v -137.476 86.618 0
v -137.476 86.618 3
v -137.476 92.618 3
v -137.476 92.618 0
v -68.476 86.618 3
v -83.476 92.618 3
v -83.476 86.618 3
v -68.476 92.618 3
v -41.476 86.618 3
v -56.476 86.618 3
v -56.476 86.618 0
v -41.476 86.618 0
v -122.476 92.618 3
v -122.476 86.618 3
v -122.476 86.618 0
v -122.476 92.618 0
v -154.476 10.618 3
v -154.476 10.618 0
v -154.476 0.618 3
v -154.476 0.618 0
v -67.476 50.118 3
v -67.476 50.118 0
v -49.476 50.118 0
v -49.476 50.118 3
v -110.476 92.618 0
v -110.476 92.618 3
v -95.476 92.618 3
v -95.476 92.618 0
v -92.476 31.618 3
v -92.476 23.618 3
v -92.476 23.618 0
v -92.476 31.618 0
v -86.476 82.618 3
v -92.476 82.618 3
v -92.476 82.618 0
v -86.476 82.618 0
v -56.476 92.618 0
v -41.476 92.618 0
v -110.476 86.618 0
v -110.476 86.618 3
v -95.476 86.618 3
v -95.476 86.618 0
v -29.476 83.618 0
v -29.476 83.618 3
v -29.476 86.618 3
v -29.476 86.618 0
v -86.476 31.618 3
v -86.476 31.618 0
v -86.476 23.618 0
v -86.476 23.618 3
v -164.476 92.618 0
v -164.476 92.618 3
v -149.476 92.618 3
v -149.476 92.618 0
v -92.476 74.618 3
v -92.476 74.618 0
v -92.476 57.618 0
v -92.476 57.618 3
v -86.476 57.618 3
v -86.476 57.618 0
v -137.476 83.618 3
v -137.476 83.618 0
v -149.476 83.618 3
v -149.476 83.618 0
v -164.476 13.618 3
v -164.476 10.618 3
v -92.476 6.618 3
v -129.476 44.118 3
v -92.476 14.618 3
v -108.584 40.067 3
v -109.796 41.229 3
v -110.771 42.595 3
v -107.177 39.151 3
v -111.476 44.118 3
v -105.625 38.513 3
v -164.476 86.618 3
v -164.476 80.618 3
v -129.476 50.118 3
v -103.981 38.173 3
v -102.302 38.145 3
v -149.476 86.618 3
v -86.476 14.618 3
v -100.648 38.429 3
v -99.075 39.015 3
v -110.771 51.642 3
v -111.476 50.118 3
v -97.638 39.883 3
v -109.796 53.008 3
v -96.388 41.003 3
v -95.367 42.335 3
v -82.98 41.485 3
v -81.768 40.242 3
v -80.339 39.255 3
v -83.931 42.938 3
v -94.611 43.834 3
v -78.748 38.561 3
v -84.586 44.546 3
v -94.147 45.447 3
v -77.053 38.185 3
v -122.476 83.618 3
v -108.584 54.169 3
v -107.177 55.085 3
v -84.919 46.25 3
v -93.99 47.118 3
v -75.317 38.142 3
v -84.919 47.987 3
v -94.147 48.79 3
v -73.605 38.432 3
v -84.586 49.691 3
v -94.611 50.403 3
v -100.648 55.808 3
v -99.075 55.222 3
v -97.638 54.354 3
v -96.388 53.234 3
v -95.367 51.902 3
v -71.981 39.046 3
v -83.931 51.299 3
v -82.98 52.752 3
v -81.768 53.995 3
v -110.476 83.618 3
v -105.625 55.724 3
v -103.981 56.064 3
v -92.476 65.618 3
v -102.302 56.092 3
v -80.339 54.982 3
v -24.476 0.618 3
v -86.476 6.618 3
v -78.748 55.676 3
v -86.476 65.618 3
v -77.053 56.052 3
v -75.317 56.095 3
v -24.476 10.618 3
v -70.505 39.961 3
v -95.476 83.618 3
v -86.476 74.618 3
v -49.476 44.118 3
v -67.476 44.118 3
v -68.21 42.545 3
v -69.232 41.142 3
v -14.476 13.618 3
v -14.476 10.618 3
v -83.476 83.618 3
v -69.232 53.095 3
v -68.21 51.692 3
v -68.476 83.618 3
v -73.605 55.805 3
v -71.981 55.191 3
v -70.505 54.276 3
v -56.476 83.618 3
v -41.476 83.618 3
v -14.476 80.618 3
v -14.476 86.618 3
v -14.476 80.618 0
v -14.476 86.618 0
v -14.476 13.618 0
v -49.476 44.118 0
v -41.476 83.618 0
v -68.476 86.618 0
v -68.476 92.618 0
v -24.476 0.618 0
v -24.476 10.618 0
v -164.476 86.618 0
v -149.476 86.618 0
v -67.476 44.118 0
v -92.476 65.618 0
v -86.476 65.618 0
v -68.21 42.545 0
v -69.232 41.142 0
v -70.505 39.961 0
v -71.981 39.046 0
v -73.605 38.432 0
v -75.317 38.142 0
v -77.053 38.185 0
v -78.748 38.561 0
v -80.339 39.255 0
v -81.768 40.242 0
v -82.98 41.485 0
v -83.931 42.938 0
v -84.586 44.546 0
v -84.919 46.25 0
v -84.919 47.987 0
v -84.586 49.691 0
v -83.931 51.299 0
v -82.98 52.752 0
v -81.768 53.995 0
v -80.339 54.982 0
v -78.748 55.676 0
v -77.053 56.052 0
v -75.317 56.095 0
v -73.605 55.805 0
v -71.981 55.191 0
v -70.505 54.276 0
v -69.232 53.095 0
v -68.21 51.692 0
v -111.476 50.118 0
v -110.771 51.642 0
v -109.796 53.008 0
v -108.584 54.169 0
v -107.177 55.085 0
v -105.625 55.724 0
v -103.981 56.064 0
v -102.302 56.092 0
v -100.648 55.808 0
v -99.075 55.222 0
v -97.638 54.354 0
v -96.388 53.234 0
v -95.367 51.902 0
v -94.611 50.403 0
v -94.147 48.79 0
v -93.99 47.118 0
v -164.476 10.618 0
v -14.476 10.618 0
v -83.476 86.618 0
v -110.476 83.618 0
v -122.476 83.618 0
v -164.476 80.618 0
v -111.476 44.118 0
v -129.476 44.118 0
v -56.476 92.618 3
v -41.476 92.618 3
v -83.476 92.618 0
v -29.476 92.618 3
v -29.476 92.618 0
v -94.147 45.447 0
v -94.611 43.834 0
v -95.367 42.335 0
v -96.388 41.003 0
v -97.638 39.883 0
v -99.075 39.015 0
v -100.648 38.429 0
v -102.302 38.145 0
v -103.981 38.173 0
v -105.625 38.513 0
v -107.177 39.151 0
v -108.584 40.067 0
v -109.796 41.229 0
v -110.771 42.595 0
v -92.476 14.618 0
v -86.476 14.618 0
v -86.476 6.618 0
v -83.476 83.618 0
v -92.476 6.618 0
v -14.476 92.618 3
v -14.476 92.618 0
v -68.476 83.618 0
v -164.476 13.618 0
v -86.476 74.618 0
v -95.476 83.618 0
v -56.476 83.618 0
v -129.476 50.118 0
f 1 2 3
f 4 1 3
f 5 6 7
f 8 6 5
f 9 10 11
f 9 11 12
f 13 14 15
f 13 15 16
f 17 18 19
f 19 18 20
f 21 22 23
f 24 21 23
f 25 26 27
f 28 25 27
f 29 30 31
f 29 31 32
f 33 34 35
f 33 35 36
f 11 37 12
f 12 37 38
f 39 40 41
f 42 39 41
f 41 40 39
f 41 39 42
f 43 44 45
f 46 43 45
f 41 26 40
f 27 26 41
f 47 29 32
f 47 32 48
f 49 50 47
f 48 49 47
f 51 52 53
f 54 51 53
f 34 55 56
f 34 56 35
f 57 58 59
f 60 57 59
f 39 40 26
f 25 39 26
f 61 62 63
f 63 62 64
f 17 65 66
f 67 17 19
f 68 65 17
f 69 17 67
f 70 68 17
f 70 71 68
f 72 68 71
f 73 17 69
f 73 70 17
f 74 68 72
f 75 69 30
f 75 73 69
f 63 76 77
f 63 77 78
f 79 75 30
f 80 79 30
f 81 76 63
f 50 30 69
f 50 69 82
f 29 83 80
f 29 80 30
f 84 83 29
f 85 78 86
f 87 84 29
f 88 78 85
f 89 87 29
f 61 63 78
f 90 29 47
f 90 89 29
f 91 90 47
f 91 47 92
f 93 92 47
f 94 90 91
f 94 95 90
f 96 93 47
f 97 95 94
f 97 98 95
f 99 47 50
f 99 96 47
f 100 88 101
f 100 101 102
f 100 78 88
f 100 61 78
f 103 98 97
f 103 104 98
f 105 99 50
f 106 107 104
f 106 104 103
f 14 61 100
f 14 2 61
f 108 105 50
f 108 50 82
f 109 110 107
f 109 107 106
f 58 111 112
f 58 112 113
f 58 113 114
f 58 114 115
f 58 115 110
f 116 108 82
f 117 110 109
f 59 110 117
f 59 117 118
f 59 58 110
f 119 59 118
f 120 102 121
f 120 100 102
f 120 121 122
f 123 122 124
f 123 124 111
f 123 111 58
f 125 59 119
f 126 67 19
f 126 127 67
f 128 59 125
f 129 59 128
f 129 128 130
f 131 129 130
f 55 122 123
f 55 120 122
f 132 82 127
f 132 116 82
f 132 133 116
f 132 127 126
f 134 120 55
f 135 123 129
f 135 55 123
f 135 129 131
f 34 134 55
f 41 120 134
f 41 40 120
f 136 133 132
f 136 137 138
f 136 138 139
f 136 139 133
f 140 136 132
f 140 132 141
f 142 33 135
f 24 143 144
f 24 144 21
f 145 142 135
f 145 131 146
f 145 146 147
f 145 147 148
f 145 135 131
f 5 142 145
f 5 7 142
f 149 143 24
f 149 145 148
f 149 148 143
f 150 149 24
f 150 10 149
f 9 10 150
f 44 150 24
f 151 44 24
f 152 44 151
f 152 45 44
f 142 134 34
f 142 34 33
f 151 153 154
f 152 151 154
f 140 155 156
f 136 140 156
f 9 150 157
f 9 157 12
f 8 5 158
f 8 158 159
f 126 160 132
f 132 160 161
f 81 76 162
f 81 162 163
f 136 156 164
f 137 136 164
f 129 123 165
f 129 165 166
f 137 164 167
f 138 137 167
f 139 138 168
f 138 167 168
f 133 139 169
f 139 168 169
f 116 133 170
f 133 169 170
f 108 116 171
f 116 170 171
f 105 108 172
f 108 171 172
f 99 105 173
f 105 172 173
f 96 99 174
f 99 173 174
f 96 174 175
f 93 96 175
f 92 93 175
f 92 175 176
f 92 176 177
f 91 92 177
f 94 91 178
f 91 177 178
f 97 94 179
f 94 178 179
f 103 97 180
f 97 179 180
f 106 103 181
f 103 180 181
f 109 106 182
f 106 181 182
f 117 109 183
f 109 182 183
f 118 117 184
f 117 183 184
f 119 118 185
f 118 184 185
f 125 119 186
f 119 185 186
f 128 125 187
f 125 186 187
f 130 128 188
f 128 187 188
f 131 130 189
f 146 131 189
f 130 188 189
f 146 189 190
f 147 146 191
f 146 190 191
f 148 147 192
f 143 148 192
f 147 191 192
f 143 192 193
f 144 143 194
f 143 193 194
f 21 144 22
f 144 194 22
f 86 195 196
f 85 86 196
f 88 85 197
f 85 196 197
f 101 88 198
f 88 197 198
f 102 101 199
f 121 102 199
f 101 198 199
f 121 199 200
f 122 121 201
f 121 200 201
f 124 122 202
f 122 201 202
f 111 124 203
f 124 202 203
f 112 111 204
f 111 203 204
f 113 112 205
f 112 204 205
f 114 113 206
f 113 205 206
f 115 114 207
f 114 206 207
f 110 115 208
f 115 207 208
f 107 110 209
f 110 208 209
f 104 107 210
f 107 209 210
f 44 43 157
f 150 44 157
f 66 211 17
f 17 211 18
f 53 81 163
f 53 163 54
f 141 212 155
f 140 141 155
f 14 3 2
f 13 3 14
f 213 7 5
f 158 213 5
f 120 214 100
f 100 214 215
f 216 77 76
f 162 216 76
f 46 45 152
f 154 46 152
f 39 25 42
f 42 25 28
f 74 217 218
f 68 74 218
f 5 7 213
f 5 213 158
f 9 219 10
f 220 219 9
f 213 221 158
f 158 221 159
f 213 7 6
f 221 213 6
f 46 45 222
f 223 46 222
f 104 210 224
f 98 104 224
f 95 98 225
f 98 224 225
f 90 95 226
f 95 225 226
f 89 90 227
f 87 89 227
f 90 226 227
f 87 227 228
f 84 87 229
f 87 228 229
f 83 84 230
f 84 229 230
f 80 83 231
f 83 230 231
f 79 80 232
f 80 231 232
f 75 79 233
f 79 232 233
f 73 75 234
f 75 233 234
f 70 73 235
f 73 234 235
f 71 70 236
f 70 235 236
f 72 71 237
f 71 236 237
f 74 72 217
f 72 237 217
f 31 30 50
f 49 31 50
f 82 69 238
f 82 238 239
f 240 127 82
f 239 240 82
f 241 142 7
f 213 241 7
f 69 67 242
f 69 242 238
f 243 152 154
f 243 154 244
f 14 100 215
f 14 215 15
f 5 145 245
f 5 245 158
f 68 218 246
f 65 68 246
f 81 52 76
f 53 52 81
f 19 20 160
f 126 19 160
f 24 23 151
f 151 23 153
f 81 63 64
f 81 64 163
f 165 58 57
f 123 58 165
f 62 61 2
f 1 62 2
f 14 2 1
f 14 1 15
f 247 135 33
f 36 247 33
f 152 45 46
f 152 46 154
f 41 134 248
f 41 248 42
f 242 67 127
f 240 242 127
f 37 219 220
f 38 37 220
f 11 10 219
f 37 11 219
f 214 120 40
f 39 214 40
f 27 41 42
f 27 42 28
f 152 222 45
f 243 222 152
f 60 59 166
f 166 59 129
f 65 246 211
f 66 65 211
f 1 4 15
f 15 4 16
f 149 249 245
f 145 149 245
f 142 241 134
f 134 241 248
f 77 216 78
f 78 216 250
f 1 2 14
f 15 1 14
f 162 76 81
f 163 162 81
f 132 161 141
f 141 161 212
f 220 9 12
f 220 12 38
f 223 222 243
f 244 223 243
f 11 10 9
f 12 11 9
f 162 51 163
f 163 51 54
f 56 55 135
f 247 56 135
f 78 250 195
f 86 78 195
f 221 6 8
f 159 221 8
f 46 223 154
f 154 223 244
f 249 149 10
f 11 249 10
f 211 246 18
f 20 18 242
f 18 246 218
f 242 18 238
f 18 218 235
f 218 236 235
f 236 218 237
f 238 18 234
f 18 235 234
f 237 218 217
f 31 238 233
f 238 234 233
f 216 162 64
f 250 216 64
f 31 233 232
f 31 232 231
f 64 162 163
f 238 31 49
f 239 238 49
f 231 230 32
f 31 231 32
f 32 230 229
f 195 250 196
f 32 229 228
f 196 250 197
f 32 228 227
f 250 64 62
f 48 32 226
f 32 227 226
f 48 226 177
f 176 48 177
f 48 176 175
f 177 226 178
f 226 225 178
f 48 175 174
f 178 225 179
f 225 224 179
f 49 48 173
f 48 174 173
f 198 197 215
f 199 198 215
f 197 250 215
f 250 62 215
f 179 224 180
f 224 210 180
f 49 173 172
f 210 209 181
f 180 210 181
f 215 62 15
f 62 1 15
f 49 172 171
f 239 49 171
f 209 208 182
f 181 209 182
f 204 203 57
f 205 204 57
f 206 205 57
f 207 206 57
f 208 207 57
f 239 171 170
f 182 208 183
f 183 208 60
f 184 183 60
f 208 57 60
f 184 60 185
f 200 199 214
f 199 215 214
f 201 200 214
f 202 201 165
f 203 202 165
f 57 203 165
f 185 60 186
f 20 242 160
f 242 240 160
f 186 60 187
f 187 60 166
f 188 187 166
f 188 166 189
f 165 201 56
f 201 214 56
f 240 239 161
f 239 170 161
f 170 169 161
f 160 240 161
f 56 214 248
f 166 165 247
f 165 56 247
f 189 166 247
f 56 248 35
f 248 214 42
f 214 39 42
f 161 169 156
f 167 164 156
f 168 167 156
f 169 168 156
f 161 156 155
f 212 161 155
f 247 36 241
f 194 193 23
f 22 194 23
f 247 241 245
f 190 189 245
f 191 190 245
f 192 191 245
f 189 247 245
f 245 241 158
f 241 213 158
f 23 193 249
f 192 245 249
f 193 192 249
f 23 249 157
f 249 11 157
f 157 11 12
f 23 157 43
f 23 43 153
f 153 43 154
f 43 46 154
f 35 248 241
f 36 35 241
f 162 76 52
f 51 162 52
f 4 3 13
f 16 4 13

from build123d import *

# Parameters (mm, degrees)
BOSS_EXTRU_1_DEPTH      = 3
ESQUISSE2_W             = 15
ESQUISSE2_H             = 3
BOSS_EXTRU_2_DEPTH      = 3
ESQUISSE3_W             = 15
ESQUISSE3_H             = 6
BOSS_EXTRU_3_DEPTH      = 3
BOSS_EXTRU_3_2_DEPTH    = 3
BOSS_EXTRU_3_3_DEPTH    = 3
BOSS_EXTRU_3_4_DEPTH    = 3
BOSS_EXTRU_3_5_DEPTH    = 3
BOSS_EXTRU_3_6_DEPTH    = 3
ESQUISSE4_W             = 6
ESQUISSE4_H             = 8
ENL_V_MAT_EXTRU_1_DEPTH = 3


with BuildPart() as part:
    # Esquisse1 → Boss.-Extru.1 (new body)
    with BuildSketch(Plane.XY):
        with BuildLine():
            Line((-164.475700203, 83.618467297), (-164.475700203, 80.618467297))
            Line((-164.475700203, 80.618467297), (-129.475700203, 50.118467297))
            Line((-129.475700203, 50.118467297), (-111.475700203, 50.118467297))
            ThreePointArc((-111.475700203, 50.118467297), (-101.468501021, 55.988854334), (-93.990418829, 47.118467297))
            ThreePointArc((-93.990418829, 47.118467297), (-101.468501021, 38.24808026), (-111.475700203, 44.118467297))
            Line((-111.475700203, 44.118467297), (-129.475700203, 44.118467297))
            Line((-129.475700203, 44.118467297), (-164.475700203, 13.618467297))
            Line((-164.475700203, 13.618467297), (-164.475700203, 10.618467297))
            Line((-164.475700203, 10.618467297), (-154.475700203, 10.618467297))
            Line((-154.475700203, 10.618467297), (-154.475700203, 0.618467297))
            Line((-154.475700203, 0.618467297), (-24.475700203, 0.618467297))
            Line((-24.475700203, 0.618467297), (-24.475700203, 10.618467297))
            Line((-24.475700203, 10.618467297), (-14.475700203, 10.618467297))
            Line((-14.475700203, 10.618467297), (-14.475700203, 13.618467297))
            Line((-14.475700203, 13.618467297), (-49.475700203, 44.118467297))
            Line((-49.475700203, 44.118467297), (-67.475700203, 44.118467297))
            ThreePointArc((-67.475700203, 44.118467297), (-84.960981578, 47.118467297), (-67.475700203, 50.118467297))
            Line((-67.475700203, 50.118467297), (-49.475700203, 50.118467297))
            Line((-49.475700203, 50.118467297), (-14.475700203, 80.618467297))
            Line((-14.475700203, 80.618467297), (-14.475700203, 83.618467297))
            Line((-14.475700203, 83.618467297), (-164.475700203, 83.618467297))
        make_face()
    extrude(amount=BOSS_EXTRU_1_DEPTH)

    # Esquisse2 → Boss.-Extru.2 (add)
    with BuildSketch(Plane.XY.offset(3)):
        with Locations((-156.975700203, 85.118467297)):
            Rectangle(ESQUISSE2_W, ESQUISSE2_H)
        with Locations((-129.975700203, 85.118467297)):
            Rectangle(ESQUISSE2_W, ESQUISSE2_H)
        with Locations((-102.975700203, 85.118467297)):
            Rectangle(ESQUISSE2_W, ESQUISSE2_H)
        with Locations((-75.975700203, 85.118467297)):
            Rectangle(ESQUISSE2_W, ESQUISSE2_H)
        with Locations((-48.975700203, 85.118467297)):
            Rectangle(ESQUISSE2_W, ESQUISSE2_H)
        with Locations((-21.975700203, 85.118467297)):
            Rectangle(ESQUISSE2_W, ESQUISSE2_H)
    extrude(amount=-BOSS_EXTRU_2_DEPTH)

    # Esquisse4 → Enlèv. mat.-Extru.1 (cut)
    with BuildSketch(Plane.XY.offset(3)):
        with Locations((-89.475700203, 78.618467297)):
            Rectangle(ESQUISSE4_W, ESQUISSE4_H)
        with Locations((-89.475700203, 61.618467297)):
            Rectangle(ESQUISSE4_W, ESQUISSE4_H)
        with Locations((-89.475700203, 27.618467297)):
            Rectangle(ESQUISSE4_W, ESQUISSE4_H)
        with Locations((-89.475700203, 10.618467297)):
            Rectangle(ESQUISSE4_W, ESQUISSE4_H)
    extrude(amount=-ENL_V_MAT_EXTRU_1_DEPTH, mode=Mode.SUBTRACT)


with BuildPart() as body_2:
    # Esquisse3 → Boss.-Extru.3 (new body)
    with BuildSketch(Plane.XY.offset(3)):
        with Locations((-156.975700203, 89.618467297)):
            Rectangle(ESQUISSE3_W, ESQUISSE3_H)
    extrude(amount=-BOSS_EXTRU_3_DEPTH)


with BuildPart() as body_3:
    # Esquisse3 → Boss.-Extru.3 2 (new body)
    with BuildSketch(Plane.XY.offset(3)):
        with Locations((-129.975700203, 89.618467297)):
            Rectangle(ESQUISSE3_W, ESQUISSE3_H)
    extrude(amount=-BOSS_EXTRU_3_2_DEPTH)


with BuildPart() as body_4:
    # Esquisse3 → Boss.-Extru.3 3 (new body)
    with BuildSketch(Plane.XY.offset(3)):
        with Locations((-102.975700203, 89.618467297)):
            Rectangle(ESQUISSE3_W, ESQUISSE3_H)
    extrude(amount=-BOSS_EXTRU_3_3_DEPTH)


with BuildPart() as body_5:
    # Esquisse3 → Boss.-Extru.3 4 (new body)
    with BuildSketch(Plane.XY.offset(3)):
        with Locations((-75.975700203, 89.618467297)):
            Rectangle(ESQUISSE3_W, ESQUISSE3_H)
    extrude(amount=-BOSS_EXTRU_3_4_DEPTH)


with BuildPart() as body_6:
    # Esquisse3 → Boss.-Extru.3 5 (new body)
    with BuildSketch(Plane.XY.offset(3)):
        with Locations((-48.975700203, 89.618467297)):
            Rectangle(ESQUISSE3_W, ESQUISSE3_H)
    extrude(amount=-BOSS_EXTRU_3_5_DEPTH)


with BuildPart() as body_7:
    # Esquisse3 → Boss.-Extru.3 6 (new body)
    with BuildSketch(Plane.XY.offset(3)):
        with Locations((-21.975700203, 89.618467297)):
            Rectangle(ESQUISSE3_W, ESQUISSE3_H)
    extrude(amount=-BOSS_EXTRU_3_6_DEPTH)


solid = Compound([part.part, body_2.part, body_3.part, body_4.part, body_5.part, body_6.part, body_7.part])
